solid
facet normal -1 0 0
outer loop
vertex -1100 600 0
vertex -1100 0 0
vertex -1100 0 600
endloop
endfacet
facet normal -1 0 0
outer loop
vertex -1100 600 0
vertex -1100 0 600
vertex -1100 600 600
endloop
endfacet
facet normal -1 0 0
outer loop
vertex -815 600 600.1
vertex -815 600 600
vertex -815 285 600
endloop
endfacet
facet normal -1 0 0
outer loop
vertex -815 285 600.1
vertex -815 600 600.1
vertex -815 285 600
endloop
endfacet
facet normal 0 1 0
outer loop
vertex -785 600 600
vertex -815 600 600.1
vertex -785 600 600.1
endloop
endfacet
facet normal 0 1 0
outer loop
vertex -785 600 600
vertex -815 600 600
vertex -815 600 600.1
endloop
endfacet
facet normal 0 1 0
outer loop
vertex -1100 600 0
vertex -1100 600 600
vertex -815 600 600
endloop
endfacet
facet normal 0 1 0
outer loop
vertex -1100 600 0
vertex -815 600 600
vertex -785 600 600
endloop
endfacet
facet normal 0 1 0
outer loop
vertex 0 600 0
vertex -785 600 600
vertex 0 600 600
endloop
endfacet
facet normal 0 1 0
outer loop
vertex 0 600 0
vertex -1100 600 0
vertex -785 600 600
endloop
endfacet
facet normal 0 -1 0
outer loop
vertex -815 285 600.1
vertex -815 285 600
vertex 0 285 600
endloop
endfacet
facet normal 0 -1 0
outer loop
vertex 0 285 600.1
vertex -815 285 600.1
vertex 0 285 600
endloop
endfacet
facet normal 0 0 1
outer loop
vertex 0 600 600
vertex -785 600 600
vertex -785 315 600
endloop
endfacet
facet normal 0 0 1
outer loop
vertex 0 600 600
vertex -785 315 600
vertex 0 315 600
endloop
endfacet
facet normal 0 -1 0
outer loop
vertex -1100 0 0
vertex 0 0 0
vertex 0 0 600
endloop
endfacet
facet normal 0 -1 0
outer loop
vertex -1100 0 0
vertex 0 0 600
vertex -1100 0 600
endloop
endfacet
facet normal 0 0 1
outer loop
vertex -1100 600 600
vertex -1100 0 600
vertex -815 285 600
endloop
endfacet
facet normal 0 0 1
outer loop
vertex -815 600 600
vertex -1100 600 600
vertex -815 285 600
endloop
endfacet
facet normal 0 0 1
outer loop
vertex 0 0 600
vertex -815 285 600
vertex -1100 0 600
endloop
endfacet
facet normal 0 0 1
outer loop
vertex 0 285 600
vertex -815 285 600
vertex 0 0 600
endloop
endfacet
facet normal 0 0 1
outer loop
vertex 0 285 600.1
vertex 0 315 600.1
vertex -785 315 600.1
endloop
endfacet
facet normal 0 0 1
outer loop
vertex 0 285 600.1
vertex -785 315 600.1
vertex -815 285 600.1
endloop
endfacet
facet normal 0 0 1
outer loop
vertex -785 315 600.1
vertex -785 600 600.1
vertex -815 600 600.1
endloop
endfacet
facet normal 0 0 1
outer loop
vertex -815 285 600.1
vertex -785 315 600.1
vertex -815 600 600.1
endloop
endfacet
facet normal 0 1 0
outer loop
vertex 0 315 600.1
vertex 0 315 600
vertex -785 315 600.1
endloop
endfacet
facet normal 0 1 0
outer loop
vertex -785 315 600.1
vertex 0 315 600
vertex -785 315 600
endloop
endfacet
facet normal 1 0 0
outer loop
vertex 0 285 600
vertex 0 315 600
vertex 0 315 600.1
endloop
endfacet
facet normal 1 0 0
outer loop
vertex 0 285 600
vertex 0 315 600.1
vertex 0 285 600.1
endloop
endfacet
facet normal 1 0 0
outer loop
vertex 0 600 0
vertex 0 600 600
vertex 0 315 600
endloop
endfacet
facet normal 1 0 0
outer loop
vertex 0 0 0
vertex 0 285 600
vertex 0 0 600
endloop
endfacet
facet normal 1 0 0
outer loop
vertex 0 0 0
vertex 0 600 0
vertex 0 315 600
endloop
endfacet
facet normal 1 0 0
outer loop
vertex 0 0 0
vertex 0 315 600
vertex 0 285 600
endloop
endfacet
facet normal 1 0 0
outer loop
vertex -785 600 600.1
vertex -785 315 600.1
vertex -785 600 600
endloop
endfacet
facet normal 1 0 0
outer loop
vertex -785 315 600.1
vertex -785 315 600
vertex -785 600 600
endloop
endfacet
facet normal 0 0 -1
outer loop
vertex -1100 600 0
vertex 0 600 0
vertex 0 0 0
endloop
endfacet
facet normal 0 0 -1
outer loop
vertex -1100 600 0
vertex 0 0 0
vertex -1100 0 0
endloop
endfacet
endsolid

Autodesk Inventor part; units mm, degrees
ref_plane "YZ Plane" through (0, 0, 0) normal (1, 0, 0) x (0, 1, 0)
ref_plane "XZ Plane" through (0, 0, 0) normal (0, 1, 0) x (-1, 0, 0)
ref_plane "XY Plane" through (0, 0, 0) normal (0, 0, 1) x (1, 0, 0)
sketch "スケッチ1" plane through (0, 0, 0) normal (0, 0, 1) x (1, 0, 0)
  line L0 (0, 0) -> (-1100, 0)
  line L1 (-1100, 0) -> (-1100, 600)
  line L2 (-1100, 600) -> (0, 600)
  line L3 (0, 600) -> (0, 0)
  line L4 (-815, 600) -> (-785, 600)
  line L5 (-785, 600) -> (-785, 285)
  line L6 (-785, 285) -> (-815, 285)
  line L7 (-815, 285) -> (-815, 600)
  line L8 (-815, 285) -> (0, 285)
  line L9 (0, 285) -> (0, 315)
  line L10 (0, 315) -> (-815, 315)
  line L11 (-815, 315) -> (-815, 285)
  point P0 (0, 300)
  point P1 (0, 300)
  dimension "d0" = 1100
  dimension "d1" = 600
  dimension "d2" = 30
  dimension "d3" = 785
extrude "押し出し1" add sketch "スケッチ1" along normal blind 600 contours L0 L1 L2 L7 L6 L8 L3 | L10 L5 L2 L3
sketch "スケッチ2" plane through (0, 0, 0) normal (0, 0, -1) x (-1, 0, 0)
  line L0 (815, 285) -> (0, 285) projected
  line L1 (815, 600) -> (815, 285) projected
  line L2 (0, 315) -> (785, 315) projected
  line L3 (785, 315) -> (785, 600) projected
  line L4 (0, 600) -> (785, 600) projected
  line L5 (0, 315) -> (0, 600) projected
  line L6 (815, 600) -> (785, 600)
  line L7 (0, 315) -> (0, 285)
extrude "押し出し2" add sketch "スケッチ2" against normal blind 600.1 contours L0 L7 L2 L3 L6 L1
sketch "スケッチ3" plane through (0, 0, 600.1) normal (0, 0, 1) x (1, 0, 0)
  line L0 (-815, 600) -> (-815, 285) projected
  line L1 (-815, 285) -> (0, 285) projected
  line L2 (0, 315) -> (-785, 315) projected
  point P0 (0, 0)
  point P1 (-800, 300)
  point P2 (-800, 500)
  point P3 (-500, 300)
  dimension "d8" = 15
  dimension "d9" = 15
  dimension "d10" = 15
  dimension "d11" = 200
  dimension "d12" = 300
  dimension "d13" = 15
equation "\"d9\" = d8"
properties part number "River 3_赤"
